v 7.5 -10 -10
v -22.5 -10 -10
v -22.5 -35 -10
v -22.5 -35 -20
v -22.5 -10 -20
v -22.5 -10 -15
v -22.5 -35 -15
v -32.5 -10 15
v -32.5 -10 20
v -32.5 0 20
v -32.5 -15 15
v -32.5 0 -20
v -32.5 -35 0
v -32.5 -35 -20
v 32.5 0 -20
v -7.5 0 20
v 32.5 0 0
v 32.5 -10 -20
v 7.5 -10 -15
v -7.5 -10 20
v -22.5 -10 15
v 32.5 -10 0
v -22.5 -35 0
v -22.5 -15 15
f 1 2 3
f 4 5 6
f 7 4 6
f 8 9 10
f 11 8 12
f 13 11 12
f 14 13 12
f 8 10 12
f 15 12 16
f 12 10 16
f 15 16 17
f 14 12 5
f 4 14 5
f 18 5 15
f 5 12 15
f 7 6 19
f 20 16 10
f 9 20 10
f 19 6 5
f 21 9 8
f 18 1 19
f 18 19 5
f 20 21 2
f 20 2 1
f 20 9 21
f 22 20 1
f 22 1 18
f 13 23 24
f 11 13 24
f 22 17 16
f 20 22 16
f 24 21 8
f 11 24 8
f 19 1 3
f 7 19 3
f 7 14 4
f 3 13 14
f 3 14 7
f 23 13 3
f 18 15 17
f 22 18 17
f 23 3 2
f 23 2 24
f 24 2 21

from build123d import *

# Parameters (mm, degrees)
F1_DEPTH = 10
F0_W     = 30
F0_H     = 5
F2_DEPTH = 35
F4_DEPTH = 10.001
F6_DEPTH = 10.001


with BuildPart() as f1:
    # F0 (on Front) → F1 (new body)
    with BuildSketch(Plane.XZ):
        Polygon((32.5, 0), (-7.5, 20), (-22.5, 20), (-32.5, 20), (-32.5, 15), (-22.5, 15), (-22.5, -10), (7.5, -10), (7.5, -15), (-22.5, -15), (-22.5, -20), (32.5, -20), align=None)
    extrude(amount=F1_DEPTH)

    # F0 (on Front) → F2 (join)
    with BuildSketch(Plane.XZ):
        Polygon((-22.5, 15), (-32.5, 15), (-32.5, 10), (-32.5, -20), (-22.5, -20), (-22.5, -15), (-22.5, -10), align=None)
        with Locations((-7.5, -12.5)):
            Rectangle(F0_W, F0_H)
    extrude(amount=F2_DEPTH)

    # F3 (on face) → F4 (cut, through all)
    with BuildSketch(Plane.XY.offset(-10)):
        Polygon((7.5, -10), (-22.5, -35), (7.5, -35), align=None)
    extrude(amount=-F4_DEPTH, mode=Mode.SUBTRACT)

    # F5 (on face) → F6 (cut, through all)
    with BuildSketch(Plane.YZ.offset(-22.5)):
        Polygon((-35, 15), (-35, 0), (-15, 15), align=None)
    extrude(amount=-F6_DEPTH, mode=Mode.SUBTRACT)


solid = f1.part
